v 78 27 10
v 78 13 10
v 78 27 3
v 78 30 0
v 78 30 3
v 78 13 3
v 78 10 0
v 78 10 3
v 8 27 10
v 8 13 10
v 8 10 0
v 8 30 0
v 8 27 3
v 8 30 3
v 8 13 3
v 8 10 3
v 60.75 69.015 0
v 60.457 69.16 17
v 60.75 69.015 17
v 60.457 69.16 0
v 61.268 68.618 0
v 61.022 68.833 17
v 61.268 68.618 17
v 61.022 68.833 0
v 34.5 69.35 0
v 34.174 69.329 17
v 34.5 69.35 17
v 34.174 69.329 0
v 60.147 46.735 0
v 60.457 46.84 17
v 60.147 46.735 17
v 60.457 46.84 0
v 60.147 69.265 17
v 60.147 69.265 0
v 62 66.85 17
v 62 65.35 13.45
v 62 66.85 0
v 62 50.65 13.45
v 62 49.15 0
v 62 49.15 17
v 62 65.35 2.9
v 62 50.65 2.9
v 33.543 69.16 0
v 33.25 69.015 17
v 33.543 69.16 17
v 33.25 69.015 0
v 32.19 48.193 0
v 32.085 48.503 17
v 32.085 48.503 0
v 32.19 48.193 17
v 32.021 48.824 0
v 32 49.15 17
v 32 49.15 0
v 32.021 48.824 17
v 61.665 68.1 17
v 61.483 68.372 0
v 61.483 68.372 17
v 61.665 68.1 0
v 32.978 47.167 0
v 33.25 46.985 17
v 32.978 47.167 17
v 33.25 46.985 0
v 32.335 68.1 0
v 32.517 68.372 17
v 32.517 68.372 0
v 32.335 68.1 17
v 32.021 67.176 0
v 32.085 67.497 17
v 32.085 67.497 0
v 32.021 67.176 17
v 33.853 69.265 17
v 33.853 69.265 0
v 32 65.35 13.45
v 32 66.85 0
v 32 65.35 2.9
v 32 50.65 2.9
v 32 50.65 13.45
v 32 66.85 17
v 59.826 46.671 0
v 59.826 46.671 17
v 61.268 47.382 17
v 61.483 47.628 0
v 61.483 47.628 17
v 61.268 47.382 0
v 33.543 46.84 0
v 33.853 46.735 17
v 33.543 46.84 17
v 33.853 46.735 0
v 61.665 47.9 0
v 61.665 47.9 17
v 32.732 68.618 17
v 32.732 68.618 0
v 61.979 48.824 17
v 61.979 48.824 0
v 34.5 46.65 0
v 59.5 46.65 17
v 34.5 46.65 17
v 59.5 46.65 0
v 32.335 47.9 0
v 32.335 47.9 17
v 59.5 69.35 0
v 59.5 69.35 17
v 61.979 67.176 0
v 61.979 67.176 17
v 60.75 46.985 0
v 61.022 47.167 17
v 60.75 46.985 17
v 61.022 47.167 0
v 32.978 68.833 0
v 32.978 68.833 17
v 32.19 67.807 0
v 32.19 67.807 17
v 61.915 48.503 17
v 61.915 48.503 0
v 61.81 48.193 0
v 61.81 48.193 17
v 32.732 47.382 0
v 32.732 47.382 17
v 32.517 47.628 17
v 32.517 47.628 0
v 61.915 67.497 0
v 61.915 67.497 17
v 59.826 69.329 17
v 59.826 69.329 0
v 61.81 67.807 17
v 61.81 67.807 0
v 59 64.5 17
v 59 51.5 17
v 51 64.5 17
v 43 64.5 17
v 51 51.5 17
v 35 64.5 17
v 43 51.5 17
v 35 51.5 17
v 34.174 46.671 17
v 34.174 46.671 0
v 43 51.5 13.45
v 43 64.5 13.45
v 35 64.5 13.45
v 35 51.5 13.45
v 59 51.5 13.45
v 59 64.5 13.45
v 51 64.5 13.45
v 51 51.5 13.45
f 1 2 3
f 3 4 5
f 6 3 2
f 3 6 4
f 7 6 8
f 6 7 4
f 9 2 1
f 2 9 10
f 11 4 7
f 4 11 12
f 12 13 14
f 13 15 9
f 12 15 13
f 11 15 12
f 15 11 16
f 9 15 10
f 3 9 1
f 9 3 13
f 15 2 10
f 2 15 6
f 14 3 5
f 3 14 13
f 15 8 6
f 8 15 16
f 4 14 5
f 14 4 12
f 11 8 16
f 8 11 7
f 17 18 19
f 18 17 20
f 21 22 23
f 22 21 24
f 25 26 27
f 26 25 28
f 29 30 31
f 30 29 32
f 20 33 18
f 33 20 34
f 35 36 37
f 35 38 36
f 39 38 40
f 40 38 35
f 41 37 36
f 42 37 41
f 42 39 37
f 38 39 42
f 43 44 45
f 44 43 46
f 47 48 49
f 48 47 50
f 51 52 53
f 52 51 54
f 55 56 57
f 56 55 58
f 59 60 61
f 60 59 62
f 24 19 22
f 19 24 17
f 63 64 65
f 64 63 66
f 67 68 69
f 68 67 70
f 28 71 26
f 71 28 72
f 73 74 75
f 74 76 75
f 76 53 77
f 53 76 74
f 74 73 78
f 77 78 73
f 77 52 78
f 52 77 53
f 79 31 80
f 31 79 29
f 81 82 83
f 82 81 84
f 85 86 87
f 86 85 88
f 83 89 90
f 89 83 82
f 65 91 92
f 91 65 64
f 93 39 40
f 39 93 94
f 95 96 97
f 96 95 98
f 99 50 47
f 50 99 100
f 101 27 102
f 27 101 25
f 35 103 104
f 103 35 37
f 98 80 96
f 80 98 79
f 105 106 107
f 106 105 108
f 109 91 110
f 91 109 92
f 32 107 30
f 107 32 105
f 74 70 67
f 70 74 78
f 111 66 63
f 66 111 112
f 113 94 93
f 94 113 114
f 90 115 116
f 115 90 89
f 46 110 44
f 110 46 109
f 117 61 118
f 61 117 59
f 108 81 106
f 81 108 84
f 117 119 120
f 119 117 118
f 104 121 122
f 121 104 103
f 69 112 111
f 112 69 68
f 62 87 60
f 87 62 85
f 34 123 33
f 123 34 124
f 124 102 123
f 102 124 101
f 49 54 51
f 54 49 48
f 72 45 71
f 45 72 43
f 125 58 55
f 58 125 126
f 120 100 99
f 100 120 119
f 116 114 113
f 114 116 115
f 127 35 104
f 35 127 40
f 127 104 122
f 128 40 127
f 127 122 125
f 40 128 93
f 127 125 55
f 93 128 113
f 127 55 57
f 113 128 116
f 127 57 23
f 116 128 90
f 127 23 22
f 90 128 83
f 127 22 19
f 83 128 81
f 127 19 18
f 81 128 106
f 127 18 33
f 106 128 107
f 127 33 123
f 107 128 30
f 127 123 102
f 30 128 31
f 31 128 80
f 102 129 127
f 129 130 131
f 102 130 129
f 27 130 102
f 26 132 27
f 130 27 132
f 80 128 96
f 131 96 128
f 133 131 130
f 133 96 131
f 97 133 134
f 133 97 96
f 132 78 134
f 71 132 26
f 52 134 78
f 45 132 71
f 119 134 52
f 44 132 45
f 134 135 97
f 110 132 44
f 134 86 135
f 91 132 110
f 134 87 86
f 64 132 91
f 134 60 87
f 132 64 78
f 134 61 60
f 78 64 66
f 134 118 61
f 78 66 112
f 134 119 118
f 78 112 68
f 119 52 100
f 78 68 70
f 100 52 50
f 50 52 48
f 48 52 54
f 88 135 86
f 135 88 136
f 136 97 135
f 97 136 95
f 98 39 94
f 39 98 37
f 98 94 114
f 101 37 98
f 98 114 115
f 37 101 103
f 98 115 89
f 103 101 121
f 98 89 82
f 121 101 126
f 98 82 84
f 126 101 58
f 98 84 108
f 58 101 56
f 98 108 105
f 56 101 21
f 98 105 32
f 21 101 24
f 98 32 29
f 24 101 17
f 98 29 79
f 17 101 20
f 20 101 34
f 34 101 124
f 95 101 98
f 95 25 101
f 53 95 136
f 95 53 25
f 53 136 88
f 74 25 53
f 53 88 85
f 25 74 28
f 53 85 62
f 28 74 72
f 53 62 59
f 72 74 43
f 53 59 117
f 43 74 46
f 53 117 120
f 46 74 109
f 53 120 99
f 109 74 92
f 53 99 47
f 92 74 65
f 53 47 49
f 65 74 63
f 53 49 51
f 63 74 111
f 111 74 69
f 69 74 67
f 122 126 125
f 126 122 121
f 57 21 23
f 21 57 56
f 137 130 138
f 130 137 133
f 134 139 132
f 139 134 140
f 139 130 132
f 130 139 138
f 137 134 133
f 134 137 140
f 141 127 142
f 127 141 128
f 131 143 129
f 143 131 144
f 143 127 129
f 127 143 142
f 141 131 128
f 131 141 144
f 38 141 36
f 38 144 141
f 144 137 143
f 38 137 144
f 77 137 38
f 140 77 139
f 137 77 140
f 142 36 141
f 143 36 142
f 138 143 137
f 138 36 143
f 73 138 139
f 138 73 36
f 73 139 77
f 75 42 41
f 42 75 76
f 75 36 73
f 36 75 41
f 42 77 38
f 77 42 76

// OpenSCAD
/*
Sample 094: Vorgespannter Feder-Schlitten — ausgewogen
Generated from the FDM Mechanical Sample Library.
Units: millimetres.

Override examples:
  openscad -o custom.stl -D 'view="plate"' -D 'render_fn=64' model.scad
  openscad -o preview.png -D 'view="assembly"' model.scad
*/
use <../../../library/fdm_mechanisms.scad>

render_fn = is_undef(render_fn) ? 48 : render_fn;
view = is_undef(view) ? "plate" : view;
$fn = render_fn;

sample_preload_slider(
    view=view,
    clearance=0.35,
    beam_t=1
);
